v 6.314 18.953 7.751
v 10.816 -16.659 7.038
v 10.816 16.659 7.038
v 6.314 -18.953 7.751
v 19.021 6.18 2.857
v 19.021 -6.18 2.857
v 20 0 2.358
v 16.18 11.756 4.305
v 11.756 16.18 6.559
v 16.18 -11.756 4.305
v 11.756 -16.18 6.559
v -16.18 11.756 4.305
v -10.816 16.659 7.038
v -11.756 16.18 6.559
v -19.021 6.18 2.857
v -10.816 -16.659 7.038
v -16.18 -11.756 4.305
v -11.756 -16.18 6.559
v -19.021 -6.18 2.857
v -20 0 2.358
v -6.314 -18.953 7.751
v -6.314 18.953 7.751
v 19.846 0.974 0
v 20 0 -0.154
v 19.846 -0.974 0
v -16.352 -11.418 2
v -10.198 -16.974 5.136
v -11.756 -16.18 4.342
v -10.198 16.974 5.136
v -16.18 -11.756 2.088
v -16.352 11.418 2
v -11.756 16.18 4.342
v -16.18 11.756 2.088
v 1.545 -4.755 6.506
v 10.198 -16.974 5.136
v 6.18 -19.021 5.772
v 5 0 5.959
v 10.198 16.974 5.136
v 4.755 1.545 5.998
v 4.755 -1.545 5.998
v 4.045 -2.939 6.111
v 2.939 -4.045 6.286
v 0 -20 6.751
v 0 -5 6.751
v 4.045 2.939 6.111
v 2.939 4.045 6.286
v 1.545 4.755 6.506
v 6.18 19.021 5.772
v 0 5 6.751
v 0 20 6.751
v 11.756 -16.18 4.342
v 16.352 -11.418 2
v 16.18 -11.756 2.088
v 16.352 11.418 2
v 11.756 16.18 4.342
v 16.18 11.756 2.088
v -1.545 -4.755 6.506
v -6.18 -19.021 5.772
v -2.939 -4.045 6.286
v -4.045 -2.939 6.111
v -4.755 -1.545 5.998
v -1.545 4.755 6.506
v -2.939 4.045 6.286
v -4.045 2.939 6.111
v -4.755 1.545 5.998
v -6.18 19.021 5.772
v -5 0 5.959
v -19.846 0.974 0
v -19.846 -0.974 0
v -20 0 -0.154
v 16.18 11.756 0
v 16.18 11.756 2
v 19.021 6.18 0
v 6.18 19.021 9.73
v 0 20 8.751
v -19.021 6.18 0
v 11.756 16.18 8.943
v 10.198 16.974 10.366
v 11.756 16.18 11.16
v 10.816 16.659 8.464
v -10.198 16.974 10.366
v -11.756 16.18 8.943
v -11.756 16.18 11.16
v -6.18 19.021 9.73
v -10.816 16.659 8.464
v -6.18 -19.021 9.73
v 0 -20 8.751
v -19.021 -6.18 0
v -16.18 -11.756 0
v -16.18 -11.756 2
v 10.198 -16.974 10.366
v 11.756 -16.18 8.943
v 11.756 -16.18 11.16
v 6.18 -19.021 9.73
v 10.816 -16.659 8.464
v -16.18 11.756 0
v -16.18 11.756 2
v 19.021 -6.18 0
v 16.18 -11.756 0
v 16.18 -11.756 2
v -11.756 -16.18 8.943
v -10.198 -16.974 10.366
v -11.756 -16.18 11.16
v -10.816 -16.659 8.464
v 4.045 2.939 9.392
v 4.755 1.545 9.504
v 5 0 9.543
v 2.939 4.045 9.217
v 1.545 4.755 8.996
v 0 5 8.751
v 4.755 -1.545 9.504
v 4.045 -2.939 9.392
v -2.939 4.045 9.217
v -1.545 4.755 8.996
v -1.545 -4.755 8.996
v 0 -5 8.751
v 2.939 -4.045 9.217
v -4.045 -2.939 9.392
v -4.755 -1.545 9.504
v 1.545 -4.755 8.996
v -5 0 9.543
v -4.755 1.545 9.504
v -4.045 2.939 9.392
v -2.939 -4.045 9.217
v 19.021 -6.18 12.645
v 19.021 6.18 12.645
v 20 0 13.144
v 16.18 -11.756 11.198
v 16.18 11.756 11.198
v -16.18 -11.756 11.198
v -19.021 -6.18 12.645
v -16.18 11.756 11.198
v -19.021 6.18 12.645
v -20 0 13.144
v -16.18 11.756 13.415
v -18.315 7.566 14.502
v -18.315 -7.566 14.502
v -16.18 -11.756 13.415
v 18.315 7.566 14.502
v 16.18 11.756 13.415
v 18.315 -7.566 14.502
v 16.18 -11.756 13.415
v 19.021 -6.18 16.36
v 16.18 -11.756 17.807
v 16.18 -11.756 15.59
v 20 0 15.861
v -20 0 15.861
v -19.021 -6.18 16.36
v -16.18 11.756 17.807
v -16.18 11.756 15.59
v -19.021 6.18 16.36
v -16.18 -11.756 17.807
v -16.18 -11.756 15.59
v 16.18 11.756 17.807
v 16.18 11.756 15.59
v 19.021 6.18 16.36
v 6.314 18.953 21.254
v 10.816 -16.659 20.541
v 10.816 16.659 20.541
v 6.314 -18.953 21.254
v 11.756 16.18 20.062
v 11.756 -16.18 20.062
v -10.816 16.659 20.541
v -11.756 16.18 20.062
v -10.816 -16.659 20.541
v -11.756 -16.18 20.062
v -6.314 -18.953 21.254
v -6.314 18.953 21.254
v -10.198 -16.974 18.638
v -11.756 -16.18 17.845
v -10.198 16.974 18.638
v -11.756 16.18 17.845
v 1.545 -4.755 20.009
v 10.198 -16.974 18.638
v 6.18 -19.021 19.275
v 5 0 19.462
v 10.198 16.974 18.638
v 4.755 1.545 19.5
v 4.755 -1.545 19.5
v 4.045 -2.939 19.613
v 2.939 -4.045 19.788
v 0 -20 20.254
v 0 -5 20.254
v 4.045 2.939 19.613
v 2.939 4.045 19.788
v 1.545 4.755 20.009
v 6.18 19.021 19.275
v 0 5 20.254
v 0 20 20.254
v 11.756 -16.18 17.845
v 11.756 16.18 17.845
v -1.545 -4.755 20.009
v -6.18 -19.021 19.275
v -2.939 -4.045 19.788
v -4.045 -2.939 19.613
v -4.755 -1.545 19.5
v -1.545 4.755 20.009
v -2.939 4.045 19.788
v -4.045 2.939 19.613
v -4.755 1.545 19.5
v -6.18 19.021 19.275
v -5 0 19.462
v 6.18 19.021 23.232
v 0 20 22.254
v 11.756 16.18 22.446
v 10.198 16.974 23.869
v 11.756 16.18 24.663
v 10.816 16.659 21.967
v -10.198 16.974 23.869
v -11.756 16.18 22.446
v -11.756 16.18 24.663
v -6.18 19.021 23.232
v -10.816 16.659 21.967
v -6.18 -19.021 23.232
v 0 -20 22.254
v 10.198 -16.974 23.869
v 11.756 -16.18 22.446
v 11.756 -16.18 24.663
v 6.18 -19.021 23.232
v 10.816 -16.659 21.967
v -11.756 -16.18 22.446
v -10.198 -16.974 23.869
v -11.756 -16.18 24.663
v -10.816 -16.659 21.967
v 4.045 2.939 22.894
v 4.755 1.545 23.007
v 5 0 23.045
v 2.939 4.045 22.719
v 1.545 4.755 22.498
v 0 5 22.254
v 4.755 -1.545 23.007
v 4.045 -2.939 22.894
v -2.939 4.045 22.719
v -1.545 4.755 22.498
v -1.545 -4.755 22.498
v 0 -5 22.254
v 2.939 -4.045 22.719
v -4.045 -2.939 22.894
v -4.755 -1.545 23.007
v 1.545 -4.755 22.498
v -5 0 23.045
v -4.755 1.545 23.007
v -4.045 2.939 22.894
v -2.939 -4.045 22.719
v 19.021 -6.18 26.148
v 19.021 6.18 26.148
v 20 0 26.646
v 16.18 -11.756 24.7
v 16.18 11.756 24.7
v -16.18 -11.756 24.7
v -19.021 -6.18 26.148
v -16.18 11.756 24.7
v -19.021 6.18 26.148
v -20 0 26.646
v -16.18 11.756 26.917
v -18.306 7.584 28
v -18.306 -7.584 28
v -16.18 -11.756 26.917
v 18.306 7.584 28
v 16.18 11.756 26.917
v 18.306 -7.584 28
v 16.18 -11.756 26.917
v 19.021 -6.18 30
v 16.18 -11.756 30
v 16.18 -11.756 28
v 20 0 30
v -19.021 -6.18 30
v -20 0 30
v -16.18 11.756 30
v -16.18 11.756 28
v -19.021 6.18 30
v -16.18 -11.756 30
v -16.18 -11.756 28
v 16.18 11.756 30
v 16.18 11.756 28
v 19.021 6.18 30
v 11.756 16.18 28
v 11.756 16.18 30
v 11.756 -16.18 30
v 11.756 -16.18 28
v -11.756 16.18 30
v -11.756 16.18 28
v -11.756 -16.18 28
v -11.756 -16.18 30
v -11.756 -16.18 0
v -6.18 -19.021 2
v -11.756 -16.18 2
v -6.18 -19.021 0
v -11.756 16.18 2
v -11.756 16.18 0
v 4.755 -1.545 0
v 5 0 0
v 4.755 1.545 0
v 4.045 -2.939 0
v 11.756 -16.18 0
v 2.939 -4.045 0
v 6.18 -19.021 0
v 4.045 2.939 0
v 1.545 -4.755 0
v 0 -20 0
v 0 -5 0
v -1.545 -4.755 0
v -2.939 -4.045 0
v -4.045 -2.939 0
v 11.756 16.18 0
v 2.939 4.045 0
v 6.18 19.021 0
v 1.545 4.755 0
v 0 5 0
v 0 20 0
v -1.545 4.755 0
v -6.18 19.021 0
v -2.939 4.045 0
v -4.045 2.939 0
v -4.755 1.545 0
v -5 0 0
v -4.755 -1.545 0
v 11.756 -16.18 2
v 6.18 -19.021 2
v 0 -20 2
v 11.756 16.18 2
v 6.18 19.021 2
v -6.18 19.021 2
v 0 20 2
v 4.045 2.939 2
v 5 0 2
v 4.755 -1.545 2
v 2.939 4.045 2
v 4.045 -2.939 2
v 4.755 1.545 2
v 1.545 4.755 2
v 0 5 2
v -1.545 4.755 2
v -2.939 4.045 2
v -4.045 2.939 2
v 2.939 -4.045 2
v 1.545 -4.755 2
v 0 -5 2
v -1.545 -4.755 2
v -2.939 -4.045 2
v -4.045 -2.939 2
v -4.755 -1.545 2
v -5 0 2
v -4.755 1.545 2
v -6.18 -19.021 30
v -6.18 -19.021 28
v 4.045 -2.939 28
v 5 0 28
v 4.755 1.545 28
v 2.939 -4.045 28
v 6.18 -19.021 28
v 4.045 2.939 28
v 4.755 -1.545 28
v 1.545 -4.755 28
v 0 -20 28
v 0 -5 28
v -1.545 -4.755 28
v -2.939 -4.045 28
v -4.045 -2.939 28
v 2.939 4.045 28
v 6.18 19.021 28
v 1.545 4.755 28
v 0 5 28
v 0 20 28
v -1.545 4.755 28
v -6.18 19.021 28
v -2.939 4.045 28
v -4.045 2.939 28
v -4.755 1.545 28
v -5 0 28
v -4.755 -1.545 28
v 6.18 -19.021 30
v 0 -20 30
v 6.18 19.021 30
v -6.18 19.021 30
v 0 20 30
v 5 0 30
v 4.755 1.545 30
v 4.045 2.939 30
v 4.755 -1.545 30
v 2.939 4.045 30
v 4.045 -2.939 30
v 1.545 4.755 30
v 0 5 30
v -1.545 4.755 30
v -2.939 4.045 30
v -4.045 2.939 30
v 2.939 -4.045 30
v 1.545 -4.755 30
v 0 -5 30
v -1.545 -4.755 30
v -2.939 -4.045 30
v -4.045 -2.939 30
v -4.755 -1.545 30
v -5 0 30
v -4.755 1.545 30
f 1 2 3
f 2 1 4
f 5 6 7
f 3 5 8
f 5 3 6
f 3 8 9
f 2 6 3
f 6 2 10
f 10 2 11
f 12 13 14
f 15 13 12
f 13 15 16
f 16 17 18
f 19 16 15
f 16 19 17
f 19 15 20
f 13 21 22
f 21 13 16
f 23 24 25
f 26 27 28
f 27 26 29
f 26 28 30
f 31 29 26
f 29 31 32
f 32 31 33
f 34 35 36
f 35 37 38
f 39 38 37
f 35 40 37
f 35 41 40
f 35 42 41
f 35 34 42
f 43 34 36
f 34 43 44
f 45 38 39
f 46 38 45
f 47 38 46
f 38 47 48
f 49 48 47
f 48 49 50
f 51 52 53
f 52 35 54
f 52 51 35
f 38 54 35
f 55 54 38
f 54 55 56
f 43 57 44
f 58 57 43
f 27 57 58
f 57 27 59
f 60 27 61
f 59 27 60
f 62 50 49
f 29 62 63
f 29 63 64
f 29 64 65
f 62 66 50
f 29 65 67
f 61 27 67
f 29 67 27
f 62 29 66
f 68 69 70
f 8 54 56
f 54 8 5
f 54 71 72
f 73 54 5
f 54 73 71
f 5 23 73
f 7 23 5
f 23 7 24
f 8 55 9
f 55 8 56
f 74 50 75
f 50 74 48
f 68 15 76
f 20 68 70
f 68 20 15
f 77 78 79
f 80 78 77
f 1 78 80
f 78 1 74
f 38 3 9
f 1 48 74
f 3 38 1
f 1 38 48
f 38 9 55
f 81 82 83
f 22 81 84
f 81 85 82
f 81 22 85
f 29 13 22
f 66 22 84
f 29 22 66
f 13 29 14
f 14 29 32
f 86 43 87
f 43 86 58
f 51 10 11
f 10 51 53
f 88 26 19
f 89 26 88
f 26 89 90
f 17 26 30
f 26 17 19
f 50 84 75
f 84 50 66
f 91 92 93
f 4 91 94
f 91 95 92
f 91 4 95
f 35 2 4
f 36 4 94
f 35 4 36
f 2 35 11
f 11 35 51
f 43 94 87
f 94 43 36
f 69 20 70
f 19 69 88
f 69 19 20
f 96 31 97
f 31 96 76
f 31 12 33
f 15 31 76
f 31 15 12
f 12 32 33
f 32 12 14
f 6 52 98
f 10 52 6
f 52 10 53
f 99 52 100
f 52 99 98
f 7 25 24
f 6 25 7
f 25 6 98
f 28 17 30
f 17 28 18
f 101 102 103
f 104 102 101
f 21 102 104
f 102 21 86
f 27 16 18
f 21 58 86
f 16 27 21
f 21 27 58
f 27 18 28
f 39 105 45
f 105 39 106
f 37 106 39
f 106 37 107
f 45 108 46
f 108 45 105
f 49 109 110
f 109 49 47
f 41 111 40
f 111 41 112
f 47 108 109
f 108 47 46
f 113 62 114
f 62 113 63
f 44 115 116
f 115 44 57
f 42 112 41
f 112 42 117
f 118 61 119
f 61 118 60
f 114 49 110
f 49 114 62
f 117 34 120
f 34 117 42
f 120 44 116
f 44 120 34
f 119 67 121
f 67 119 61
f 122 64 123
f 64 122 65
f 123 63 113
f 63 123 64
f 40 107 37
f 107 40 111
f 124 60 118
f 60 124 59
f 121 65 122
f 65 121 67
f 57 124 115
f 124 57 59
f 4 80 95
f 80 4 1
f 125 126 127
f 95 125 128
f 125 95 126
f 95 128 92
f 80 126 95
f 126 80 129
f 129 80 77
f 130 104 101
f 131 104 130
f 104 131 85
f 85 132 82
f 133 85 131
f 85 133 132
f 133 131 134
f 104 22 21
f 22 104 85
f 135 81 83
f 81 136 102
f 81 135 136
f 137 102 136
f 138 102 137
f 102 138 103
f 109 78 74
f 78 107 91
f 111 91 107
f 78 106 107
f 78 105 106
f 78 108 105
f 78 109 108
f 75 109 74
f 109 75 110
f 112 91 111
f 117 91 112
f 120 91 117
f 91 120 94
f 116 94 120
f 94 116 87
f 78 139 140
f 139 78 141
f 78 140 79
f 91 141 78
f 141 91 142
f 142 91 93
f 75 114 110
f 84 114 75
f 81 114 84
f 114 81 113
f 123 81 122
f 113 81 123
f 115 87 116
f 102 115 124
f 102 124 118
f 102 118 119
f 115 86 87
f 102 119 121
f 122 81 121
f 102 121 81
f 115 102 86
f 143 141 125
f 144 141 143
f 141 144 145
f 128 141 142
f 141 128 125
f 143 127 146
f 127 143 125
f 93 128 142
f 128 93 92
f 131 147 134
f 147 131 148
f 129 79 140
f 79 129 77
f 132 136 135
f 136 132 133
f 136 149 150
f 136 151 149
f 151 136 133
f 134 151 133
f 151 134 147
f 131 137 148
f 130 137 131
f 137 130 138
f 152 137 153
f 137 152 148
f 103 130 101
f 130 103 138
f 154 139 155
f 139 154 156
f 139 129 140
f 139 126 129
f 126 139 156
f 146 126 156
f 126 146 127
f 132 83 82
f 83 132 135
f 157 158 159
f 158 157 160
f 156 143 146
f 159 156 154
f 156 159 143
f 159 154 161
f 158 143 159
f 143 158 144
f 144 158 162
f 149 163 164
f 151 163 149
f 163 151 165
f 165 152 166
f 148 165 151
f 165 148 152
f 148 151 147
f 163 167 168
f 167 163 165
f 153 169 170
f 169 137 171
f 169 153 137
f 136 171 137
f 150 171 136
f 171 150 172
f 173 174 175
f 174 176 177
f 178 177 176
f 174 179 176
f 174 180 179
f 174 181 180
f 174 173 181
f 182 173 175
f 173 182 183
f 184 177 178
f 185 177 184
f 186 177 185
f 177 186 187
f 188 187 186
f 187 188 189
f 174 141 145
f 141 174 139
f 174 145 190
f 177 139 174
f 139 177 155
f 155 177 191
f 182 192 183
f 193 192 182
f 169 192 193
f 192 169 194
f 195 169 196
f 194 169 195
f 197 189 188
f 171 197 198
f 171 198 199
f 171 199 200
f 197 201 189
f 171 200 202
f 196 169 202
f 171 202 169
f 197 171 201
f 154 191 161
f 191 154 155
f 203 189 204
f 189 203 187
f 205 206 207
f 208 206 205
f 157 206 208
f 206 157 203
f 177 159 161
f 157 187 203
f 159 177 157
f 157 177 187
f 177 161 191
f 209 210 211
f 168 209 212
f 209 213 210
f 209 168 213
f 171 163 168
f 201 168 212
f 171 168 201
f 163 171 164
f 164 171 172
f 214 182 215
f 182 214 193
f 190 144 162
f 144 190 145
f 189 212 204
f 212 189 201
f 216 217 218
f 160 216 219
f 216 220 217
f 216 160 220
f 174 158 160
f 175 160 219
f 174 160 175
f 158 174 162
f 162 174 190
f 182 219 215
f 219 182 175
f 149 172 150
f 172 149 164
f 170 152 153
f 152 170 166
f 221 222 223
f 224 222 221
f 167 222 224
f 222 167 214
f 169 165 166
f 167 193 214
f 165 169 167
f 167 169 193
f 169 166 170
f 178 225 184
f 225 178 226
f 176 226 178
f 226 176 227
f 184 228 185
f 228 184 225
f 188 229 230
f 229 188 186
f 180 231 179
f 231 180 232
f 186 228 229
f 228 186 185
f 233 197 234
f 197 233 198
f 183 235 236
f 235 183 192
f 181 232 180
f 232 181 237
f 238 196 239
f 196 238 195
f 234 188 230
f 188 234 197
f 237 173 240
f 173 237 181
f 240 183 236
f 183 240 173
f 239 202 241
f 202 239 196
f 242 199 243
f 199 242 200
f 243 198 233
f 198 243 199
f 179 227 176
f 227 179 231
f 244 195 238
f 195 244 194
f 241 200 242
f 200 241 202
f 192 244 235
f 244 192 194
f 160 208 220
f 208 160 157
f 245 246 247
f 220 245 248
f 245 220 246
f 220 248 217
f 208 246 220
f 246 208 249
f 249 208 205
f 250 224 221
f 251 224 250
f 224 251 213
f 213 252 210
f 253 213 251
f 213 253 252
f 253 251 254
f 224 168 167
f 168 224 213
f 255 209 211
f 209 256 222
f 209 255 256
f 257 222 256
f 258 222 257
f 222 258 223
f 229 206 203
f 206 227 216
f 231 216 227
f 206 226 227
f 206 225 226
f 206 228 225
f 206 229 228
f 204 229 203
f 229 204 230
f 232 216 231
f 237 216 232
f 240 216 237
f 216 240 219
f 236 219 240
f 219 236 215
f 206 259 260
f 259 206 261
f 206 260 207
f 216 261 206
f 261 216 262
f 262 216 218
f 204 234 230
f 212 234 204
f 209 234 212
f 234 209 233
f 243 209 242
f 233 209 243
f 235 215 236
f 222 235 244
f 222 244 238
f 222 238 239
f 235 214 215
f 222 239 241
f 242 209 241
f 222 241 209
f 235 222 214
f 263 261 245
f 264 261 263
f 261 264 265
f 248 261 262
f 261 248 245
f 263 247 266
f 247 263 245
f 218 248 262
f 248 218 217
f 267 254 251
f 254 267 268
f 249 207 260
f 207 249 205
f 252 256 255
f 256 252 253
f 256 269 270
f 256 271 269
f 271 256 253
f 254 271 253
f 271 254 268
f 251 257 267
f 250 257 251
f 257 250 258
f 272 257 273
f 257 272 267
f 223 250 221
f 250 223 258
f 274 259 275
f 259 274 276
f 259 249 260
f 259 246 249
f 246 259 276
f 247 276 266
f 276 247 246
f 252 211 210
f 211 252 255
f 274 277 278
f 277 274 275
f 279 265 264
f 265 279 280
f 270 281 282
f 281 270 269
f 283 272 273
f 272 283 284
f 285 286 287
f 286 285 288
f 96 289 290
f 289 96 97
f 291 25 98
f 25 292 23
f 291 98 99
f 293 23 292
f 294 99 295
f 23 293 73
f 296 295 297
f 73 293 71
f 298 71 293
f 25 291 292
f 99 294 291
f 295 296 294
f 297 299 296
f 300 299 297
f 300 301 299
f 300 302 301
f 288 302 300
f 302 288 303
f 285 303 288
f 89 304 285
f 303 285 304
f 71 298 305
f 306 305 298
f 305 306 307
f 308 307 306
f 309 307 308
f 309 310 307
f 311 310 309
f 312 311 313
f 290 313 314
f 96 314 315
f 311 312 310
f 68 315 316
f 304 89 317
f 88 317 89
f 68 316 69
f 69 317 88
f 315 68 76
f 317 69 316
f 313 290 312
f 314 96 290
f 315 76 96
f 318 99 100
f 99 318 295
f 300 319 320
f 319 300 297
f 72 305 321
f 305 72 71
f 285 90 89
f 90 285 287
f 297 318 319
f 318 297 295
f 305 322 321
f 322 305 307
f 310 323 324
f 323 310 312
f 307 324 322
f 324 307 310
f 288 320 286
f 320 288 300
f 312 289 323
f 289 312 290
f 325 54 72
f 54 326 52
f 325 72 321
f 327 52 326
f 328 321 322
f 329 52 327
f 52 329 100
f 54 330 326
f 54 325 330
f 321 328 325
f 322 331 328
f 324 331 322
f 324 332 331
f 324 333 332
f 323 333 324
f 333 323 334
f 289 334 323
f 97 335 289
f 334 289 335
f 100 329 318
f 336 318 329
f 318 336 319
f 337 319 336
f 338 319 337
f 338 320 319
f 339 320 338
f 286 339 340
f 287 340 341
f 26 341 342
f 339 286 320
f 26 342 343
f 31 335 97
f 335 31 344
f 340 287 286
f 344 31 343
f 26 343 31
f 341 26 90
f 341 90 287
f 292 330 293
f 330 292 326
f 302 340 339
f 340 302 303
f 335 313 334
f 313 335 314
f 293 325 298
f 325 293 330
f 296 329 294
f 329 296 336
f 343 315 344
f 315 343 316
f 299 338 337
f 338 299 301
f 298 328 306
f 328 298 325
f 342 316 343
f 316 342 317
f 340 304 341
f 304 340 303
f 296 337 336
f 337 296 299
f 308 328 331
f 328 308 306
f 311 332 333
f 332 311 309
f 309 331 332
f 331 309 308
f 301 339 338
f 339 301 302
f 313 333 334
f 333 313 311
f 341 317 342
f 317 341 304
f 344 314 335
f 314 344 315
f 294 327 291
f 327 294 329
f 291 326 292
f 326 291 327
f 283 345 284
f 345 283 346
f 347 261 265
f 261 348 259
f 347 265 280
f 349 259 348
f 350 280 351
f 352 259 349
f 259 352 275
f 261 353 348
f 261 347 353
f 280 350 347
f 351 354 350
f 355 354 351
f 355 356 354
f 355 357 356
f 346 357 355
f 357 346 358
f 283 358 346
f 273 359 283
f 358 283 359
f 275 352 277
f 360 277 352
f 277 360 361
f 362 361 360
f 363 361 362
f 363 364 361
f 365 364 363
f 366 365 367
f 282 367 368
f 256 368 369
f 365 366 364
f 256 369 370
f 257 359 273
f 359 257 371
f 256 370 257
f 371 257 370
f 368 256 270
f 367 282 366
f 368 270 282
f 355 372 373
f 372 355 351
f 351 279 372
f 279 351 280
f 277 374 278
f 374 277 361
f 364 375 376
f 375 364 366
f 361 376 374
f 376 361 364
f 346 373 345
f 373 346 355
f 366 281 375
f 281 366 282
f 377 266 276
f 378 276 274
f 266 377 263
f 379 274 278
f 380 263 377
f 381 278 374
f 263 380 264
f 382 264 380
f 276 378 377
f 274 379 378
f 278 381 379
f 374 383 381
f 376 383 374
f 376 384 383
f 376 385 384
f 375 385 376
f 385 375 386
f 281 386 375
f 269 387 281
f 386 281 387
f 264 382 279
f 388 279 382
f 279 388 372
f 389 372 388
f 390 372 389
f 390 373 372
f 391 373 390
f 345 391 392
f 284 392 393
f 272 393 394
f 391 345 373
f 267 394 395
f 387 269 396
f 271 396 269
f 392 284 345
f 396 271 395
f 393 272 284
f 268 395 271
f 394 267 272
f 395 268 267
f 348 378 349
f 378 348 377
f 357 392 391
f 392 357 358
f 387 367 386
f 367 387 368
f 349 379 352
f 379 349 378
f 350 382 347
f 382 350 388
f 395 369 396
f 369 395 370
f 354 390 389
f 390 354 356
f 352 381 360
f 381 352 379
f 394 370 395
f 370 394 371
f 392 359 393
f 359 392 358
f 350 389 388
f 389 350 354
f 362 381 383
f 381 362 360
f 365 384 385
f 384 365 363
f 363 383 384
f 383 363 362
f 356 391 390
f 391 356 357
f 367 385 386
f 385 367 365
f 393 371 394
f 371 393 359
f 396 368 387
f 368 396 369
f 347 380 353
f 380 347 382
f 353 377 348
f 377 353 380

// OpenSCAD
// Customizable spring
// By Magonegro JUL-2016
// This constructs a spring based on a series of washers
// Print it horizontaly with buildplate support only.
// Remember that under compression this spring will increase its diameter.

// Outer radius of the spring
ROUT=20;
// Inner radius
RIN=5;
// Height
HEIGHT=30;
// Washer's radius. Keep this around 2XROUT. You can change this to get different elastic properties (values from 1.5X to 3X make sense, defaults to 2X)
RWASHER=35;
// Washer's thickness
HEIGHTWASHER=2;
// Height of the spring base. 0 for nothing
BASECYLINDER=2;
// Resolution (min 60)
FACETS=20;

// [hidden]
// Height of the washer
A=RWASHER-sin(acos(ROUT/(RWASHER-HEIGHTWASHER)))*((RWASHER-HEIGHTWASHER));

NUMWASHERS=(HEIGHT/(A-HEIGHTWASHER));

module washer()
{
    intersection()
    {
    translate([0,0,-RWASHER+(A/2)])
    rotate([90,0,0])
        difference()
        {
        cylinder(r=RWASHER,h=ROUT*2.1,center=true,$fn=FACETS);
        cylinder(r=RWASHER-HEIGHTWASHER,h=ROUT*2.1,center=true,$fn=FACETS);
        }
    difference()
        {
        cylinder(r=ROUT,h=2*A,center=true,$fn=FACETS);
        cylinder(r=RIN,h=2*A,center=true,$fn=FACETS);
        }
    }
}

module makebase()
{
    translate([0,0,BASECYLINDER/2])
        difference()
            {
            cylinder(r=ROUT,h=BASECYLINDER,center=true,$fn=FACETS);
            cylinder(r=RIN,h=BASECYLINDER,center=true,$fn=FACETS);
            }

    translate([0,0,HEIGHT-BASECYLINDER/2])
        difference()
            {
            cylinder(r=ROUT,h=BASECYLINDER,center=true,$fn=FACETS);
            cylinder(r=RIN,h=BASECYLINDER,center=true,$fn=FACETS);
            }
}

render() difference()
{
    union()
    {
    for(n=[0:1:NUMWASHERS])
        translate([0,0,(A/2)+(A-HEIGHTWASHER)*n])
            rotate([180*n,0,0])
                render() washer();
        if(BASECYLINDER!=0)
            {
            render() makebase();
            };
    }
    // Remove top excess due to rounding
    translate([0,0,HEIGHT]) cylinder(h=2*A,r=ROUT*1.2);
}
